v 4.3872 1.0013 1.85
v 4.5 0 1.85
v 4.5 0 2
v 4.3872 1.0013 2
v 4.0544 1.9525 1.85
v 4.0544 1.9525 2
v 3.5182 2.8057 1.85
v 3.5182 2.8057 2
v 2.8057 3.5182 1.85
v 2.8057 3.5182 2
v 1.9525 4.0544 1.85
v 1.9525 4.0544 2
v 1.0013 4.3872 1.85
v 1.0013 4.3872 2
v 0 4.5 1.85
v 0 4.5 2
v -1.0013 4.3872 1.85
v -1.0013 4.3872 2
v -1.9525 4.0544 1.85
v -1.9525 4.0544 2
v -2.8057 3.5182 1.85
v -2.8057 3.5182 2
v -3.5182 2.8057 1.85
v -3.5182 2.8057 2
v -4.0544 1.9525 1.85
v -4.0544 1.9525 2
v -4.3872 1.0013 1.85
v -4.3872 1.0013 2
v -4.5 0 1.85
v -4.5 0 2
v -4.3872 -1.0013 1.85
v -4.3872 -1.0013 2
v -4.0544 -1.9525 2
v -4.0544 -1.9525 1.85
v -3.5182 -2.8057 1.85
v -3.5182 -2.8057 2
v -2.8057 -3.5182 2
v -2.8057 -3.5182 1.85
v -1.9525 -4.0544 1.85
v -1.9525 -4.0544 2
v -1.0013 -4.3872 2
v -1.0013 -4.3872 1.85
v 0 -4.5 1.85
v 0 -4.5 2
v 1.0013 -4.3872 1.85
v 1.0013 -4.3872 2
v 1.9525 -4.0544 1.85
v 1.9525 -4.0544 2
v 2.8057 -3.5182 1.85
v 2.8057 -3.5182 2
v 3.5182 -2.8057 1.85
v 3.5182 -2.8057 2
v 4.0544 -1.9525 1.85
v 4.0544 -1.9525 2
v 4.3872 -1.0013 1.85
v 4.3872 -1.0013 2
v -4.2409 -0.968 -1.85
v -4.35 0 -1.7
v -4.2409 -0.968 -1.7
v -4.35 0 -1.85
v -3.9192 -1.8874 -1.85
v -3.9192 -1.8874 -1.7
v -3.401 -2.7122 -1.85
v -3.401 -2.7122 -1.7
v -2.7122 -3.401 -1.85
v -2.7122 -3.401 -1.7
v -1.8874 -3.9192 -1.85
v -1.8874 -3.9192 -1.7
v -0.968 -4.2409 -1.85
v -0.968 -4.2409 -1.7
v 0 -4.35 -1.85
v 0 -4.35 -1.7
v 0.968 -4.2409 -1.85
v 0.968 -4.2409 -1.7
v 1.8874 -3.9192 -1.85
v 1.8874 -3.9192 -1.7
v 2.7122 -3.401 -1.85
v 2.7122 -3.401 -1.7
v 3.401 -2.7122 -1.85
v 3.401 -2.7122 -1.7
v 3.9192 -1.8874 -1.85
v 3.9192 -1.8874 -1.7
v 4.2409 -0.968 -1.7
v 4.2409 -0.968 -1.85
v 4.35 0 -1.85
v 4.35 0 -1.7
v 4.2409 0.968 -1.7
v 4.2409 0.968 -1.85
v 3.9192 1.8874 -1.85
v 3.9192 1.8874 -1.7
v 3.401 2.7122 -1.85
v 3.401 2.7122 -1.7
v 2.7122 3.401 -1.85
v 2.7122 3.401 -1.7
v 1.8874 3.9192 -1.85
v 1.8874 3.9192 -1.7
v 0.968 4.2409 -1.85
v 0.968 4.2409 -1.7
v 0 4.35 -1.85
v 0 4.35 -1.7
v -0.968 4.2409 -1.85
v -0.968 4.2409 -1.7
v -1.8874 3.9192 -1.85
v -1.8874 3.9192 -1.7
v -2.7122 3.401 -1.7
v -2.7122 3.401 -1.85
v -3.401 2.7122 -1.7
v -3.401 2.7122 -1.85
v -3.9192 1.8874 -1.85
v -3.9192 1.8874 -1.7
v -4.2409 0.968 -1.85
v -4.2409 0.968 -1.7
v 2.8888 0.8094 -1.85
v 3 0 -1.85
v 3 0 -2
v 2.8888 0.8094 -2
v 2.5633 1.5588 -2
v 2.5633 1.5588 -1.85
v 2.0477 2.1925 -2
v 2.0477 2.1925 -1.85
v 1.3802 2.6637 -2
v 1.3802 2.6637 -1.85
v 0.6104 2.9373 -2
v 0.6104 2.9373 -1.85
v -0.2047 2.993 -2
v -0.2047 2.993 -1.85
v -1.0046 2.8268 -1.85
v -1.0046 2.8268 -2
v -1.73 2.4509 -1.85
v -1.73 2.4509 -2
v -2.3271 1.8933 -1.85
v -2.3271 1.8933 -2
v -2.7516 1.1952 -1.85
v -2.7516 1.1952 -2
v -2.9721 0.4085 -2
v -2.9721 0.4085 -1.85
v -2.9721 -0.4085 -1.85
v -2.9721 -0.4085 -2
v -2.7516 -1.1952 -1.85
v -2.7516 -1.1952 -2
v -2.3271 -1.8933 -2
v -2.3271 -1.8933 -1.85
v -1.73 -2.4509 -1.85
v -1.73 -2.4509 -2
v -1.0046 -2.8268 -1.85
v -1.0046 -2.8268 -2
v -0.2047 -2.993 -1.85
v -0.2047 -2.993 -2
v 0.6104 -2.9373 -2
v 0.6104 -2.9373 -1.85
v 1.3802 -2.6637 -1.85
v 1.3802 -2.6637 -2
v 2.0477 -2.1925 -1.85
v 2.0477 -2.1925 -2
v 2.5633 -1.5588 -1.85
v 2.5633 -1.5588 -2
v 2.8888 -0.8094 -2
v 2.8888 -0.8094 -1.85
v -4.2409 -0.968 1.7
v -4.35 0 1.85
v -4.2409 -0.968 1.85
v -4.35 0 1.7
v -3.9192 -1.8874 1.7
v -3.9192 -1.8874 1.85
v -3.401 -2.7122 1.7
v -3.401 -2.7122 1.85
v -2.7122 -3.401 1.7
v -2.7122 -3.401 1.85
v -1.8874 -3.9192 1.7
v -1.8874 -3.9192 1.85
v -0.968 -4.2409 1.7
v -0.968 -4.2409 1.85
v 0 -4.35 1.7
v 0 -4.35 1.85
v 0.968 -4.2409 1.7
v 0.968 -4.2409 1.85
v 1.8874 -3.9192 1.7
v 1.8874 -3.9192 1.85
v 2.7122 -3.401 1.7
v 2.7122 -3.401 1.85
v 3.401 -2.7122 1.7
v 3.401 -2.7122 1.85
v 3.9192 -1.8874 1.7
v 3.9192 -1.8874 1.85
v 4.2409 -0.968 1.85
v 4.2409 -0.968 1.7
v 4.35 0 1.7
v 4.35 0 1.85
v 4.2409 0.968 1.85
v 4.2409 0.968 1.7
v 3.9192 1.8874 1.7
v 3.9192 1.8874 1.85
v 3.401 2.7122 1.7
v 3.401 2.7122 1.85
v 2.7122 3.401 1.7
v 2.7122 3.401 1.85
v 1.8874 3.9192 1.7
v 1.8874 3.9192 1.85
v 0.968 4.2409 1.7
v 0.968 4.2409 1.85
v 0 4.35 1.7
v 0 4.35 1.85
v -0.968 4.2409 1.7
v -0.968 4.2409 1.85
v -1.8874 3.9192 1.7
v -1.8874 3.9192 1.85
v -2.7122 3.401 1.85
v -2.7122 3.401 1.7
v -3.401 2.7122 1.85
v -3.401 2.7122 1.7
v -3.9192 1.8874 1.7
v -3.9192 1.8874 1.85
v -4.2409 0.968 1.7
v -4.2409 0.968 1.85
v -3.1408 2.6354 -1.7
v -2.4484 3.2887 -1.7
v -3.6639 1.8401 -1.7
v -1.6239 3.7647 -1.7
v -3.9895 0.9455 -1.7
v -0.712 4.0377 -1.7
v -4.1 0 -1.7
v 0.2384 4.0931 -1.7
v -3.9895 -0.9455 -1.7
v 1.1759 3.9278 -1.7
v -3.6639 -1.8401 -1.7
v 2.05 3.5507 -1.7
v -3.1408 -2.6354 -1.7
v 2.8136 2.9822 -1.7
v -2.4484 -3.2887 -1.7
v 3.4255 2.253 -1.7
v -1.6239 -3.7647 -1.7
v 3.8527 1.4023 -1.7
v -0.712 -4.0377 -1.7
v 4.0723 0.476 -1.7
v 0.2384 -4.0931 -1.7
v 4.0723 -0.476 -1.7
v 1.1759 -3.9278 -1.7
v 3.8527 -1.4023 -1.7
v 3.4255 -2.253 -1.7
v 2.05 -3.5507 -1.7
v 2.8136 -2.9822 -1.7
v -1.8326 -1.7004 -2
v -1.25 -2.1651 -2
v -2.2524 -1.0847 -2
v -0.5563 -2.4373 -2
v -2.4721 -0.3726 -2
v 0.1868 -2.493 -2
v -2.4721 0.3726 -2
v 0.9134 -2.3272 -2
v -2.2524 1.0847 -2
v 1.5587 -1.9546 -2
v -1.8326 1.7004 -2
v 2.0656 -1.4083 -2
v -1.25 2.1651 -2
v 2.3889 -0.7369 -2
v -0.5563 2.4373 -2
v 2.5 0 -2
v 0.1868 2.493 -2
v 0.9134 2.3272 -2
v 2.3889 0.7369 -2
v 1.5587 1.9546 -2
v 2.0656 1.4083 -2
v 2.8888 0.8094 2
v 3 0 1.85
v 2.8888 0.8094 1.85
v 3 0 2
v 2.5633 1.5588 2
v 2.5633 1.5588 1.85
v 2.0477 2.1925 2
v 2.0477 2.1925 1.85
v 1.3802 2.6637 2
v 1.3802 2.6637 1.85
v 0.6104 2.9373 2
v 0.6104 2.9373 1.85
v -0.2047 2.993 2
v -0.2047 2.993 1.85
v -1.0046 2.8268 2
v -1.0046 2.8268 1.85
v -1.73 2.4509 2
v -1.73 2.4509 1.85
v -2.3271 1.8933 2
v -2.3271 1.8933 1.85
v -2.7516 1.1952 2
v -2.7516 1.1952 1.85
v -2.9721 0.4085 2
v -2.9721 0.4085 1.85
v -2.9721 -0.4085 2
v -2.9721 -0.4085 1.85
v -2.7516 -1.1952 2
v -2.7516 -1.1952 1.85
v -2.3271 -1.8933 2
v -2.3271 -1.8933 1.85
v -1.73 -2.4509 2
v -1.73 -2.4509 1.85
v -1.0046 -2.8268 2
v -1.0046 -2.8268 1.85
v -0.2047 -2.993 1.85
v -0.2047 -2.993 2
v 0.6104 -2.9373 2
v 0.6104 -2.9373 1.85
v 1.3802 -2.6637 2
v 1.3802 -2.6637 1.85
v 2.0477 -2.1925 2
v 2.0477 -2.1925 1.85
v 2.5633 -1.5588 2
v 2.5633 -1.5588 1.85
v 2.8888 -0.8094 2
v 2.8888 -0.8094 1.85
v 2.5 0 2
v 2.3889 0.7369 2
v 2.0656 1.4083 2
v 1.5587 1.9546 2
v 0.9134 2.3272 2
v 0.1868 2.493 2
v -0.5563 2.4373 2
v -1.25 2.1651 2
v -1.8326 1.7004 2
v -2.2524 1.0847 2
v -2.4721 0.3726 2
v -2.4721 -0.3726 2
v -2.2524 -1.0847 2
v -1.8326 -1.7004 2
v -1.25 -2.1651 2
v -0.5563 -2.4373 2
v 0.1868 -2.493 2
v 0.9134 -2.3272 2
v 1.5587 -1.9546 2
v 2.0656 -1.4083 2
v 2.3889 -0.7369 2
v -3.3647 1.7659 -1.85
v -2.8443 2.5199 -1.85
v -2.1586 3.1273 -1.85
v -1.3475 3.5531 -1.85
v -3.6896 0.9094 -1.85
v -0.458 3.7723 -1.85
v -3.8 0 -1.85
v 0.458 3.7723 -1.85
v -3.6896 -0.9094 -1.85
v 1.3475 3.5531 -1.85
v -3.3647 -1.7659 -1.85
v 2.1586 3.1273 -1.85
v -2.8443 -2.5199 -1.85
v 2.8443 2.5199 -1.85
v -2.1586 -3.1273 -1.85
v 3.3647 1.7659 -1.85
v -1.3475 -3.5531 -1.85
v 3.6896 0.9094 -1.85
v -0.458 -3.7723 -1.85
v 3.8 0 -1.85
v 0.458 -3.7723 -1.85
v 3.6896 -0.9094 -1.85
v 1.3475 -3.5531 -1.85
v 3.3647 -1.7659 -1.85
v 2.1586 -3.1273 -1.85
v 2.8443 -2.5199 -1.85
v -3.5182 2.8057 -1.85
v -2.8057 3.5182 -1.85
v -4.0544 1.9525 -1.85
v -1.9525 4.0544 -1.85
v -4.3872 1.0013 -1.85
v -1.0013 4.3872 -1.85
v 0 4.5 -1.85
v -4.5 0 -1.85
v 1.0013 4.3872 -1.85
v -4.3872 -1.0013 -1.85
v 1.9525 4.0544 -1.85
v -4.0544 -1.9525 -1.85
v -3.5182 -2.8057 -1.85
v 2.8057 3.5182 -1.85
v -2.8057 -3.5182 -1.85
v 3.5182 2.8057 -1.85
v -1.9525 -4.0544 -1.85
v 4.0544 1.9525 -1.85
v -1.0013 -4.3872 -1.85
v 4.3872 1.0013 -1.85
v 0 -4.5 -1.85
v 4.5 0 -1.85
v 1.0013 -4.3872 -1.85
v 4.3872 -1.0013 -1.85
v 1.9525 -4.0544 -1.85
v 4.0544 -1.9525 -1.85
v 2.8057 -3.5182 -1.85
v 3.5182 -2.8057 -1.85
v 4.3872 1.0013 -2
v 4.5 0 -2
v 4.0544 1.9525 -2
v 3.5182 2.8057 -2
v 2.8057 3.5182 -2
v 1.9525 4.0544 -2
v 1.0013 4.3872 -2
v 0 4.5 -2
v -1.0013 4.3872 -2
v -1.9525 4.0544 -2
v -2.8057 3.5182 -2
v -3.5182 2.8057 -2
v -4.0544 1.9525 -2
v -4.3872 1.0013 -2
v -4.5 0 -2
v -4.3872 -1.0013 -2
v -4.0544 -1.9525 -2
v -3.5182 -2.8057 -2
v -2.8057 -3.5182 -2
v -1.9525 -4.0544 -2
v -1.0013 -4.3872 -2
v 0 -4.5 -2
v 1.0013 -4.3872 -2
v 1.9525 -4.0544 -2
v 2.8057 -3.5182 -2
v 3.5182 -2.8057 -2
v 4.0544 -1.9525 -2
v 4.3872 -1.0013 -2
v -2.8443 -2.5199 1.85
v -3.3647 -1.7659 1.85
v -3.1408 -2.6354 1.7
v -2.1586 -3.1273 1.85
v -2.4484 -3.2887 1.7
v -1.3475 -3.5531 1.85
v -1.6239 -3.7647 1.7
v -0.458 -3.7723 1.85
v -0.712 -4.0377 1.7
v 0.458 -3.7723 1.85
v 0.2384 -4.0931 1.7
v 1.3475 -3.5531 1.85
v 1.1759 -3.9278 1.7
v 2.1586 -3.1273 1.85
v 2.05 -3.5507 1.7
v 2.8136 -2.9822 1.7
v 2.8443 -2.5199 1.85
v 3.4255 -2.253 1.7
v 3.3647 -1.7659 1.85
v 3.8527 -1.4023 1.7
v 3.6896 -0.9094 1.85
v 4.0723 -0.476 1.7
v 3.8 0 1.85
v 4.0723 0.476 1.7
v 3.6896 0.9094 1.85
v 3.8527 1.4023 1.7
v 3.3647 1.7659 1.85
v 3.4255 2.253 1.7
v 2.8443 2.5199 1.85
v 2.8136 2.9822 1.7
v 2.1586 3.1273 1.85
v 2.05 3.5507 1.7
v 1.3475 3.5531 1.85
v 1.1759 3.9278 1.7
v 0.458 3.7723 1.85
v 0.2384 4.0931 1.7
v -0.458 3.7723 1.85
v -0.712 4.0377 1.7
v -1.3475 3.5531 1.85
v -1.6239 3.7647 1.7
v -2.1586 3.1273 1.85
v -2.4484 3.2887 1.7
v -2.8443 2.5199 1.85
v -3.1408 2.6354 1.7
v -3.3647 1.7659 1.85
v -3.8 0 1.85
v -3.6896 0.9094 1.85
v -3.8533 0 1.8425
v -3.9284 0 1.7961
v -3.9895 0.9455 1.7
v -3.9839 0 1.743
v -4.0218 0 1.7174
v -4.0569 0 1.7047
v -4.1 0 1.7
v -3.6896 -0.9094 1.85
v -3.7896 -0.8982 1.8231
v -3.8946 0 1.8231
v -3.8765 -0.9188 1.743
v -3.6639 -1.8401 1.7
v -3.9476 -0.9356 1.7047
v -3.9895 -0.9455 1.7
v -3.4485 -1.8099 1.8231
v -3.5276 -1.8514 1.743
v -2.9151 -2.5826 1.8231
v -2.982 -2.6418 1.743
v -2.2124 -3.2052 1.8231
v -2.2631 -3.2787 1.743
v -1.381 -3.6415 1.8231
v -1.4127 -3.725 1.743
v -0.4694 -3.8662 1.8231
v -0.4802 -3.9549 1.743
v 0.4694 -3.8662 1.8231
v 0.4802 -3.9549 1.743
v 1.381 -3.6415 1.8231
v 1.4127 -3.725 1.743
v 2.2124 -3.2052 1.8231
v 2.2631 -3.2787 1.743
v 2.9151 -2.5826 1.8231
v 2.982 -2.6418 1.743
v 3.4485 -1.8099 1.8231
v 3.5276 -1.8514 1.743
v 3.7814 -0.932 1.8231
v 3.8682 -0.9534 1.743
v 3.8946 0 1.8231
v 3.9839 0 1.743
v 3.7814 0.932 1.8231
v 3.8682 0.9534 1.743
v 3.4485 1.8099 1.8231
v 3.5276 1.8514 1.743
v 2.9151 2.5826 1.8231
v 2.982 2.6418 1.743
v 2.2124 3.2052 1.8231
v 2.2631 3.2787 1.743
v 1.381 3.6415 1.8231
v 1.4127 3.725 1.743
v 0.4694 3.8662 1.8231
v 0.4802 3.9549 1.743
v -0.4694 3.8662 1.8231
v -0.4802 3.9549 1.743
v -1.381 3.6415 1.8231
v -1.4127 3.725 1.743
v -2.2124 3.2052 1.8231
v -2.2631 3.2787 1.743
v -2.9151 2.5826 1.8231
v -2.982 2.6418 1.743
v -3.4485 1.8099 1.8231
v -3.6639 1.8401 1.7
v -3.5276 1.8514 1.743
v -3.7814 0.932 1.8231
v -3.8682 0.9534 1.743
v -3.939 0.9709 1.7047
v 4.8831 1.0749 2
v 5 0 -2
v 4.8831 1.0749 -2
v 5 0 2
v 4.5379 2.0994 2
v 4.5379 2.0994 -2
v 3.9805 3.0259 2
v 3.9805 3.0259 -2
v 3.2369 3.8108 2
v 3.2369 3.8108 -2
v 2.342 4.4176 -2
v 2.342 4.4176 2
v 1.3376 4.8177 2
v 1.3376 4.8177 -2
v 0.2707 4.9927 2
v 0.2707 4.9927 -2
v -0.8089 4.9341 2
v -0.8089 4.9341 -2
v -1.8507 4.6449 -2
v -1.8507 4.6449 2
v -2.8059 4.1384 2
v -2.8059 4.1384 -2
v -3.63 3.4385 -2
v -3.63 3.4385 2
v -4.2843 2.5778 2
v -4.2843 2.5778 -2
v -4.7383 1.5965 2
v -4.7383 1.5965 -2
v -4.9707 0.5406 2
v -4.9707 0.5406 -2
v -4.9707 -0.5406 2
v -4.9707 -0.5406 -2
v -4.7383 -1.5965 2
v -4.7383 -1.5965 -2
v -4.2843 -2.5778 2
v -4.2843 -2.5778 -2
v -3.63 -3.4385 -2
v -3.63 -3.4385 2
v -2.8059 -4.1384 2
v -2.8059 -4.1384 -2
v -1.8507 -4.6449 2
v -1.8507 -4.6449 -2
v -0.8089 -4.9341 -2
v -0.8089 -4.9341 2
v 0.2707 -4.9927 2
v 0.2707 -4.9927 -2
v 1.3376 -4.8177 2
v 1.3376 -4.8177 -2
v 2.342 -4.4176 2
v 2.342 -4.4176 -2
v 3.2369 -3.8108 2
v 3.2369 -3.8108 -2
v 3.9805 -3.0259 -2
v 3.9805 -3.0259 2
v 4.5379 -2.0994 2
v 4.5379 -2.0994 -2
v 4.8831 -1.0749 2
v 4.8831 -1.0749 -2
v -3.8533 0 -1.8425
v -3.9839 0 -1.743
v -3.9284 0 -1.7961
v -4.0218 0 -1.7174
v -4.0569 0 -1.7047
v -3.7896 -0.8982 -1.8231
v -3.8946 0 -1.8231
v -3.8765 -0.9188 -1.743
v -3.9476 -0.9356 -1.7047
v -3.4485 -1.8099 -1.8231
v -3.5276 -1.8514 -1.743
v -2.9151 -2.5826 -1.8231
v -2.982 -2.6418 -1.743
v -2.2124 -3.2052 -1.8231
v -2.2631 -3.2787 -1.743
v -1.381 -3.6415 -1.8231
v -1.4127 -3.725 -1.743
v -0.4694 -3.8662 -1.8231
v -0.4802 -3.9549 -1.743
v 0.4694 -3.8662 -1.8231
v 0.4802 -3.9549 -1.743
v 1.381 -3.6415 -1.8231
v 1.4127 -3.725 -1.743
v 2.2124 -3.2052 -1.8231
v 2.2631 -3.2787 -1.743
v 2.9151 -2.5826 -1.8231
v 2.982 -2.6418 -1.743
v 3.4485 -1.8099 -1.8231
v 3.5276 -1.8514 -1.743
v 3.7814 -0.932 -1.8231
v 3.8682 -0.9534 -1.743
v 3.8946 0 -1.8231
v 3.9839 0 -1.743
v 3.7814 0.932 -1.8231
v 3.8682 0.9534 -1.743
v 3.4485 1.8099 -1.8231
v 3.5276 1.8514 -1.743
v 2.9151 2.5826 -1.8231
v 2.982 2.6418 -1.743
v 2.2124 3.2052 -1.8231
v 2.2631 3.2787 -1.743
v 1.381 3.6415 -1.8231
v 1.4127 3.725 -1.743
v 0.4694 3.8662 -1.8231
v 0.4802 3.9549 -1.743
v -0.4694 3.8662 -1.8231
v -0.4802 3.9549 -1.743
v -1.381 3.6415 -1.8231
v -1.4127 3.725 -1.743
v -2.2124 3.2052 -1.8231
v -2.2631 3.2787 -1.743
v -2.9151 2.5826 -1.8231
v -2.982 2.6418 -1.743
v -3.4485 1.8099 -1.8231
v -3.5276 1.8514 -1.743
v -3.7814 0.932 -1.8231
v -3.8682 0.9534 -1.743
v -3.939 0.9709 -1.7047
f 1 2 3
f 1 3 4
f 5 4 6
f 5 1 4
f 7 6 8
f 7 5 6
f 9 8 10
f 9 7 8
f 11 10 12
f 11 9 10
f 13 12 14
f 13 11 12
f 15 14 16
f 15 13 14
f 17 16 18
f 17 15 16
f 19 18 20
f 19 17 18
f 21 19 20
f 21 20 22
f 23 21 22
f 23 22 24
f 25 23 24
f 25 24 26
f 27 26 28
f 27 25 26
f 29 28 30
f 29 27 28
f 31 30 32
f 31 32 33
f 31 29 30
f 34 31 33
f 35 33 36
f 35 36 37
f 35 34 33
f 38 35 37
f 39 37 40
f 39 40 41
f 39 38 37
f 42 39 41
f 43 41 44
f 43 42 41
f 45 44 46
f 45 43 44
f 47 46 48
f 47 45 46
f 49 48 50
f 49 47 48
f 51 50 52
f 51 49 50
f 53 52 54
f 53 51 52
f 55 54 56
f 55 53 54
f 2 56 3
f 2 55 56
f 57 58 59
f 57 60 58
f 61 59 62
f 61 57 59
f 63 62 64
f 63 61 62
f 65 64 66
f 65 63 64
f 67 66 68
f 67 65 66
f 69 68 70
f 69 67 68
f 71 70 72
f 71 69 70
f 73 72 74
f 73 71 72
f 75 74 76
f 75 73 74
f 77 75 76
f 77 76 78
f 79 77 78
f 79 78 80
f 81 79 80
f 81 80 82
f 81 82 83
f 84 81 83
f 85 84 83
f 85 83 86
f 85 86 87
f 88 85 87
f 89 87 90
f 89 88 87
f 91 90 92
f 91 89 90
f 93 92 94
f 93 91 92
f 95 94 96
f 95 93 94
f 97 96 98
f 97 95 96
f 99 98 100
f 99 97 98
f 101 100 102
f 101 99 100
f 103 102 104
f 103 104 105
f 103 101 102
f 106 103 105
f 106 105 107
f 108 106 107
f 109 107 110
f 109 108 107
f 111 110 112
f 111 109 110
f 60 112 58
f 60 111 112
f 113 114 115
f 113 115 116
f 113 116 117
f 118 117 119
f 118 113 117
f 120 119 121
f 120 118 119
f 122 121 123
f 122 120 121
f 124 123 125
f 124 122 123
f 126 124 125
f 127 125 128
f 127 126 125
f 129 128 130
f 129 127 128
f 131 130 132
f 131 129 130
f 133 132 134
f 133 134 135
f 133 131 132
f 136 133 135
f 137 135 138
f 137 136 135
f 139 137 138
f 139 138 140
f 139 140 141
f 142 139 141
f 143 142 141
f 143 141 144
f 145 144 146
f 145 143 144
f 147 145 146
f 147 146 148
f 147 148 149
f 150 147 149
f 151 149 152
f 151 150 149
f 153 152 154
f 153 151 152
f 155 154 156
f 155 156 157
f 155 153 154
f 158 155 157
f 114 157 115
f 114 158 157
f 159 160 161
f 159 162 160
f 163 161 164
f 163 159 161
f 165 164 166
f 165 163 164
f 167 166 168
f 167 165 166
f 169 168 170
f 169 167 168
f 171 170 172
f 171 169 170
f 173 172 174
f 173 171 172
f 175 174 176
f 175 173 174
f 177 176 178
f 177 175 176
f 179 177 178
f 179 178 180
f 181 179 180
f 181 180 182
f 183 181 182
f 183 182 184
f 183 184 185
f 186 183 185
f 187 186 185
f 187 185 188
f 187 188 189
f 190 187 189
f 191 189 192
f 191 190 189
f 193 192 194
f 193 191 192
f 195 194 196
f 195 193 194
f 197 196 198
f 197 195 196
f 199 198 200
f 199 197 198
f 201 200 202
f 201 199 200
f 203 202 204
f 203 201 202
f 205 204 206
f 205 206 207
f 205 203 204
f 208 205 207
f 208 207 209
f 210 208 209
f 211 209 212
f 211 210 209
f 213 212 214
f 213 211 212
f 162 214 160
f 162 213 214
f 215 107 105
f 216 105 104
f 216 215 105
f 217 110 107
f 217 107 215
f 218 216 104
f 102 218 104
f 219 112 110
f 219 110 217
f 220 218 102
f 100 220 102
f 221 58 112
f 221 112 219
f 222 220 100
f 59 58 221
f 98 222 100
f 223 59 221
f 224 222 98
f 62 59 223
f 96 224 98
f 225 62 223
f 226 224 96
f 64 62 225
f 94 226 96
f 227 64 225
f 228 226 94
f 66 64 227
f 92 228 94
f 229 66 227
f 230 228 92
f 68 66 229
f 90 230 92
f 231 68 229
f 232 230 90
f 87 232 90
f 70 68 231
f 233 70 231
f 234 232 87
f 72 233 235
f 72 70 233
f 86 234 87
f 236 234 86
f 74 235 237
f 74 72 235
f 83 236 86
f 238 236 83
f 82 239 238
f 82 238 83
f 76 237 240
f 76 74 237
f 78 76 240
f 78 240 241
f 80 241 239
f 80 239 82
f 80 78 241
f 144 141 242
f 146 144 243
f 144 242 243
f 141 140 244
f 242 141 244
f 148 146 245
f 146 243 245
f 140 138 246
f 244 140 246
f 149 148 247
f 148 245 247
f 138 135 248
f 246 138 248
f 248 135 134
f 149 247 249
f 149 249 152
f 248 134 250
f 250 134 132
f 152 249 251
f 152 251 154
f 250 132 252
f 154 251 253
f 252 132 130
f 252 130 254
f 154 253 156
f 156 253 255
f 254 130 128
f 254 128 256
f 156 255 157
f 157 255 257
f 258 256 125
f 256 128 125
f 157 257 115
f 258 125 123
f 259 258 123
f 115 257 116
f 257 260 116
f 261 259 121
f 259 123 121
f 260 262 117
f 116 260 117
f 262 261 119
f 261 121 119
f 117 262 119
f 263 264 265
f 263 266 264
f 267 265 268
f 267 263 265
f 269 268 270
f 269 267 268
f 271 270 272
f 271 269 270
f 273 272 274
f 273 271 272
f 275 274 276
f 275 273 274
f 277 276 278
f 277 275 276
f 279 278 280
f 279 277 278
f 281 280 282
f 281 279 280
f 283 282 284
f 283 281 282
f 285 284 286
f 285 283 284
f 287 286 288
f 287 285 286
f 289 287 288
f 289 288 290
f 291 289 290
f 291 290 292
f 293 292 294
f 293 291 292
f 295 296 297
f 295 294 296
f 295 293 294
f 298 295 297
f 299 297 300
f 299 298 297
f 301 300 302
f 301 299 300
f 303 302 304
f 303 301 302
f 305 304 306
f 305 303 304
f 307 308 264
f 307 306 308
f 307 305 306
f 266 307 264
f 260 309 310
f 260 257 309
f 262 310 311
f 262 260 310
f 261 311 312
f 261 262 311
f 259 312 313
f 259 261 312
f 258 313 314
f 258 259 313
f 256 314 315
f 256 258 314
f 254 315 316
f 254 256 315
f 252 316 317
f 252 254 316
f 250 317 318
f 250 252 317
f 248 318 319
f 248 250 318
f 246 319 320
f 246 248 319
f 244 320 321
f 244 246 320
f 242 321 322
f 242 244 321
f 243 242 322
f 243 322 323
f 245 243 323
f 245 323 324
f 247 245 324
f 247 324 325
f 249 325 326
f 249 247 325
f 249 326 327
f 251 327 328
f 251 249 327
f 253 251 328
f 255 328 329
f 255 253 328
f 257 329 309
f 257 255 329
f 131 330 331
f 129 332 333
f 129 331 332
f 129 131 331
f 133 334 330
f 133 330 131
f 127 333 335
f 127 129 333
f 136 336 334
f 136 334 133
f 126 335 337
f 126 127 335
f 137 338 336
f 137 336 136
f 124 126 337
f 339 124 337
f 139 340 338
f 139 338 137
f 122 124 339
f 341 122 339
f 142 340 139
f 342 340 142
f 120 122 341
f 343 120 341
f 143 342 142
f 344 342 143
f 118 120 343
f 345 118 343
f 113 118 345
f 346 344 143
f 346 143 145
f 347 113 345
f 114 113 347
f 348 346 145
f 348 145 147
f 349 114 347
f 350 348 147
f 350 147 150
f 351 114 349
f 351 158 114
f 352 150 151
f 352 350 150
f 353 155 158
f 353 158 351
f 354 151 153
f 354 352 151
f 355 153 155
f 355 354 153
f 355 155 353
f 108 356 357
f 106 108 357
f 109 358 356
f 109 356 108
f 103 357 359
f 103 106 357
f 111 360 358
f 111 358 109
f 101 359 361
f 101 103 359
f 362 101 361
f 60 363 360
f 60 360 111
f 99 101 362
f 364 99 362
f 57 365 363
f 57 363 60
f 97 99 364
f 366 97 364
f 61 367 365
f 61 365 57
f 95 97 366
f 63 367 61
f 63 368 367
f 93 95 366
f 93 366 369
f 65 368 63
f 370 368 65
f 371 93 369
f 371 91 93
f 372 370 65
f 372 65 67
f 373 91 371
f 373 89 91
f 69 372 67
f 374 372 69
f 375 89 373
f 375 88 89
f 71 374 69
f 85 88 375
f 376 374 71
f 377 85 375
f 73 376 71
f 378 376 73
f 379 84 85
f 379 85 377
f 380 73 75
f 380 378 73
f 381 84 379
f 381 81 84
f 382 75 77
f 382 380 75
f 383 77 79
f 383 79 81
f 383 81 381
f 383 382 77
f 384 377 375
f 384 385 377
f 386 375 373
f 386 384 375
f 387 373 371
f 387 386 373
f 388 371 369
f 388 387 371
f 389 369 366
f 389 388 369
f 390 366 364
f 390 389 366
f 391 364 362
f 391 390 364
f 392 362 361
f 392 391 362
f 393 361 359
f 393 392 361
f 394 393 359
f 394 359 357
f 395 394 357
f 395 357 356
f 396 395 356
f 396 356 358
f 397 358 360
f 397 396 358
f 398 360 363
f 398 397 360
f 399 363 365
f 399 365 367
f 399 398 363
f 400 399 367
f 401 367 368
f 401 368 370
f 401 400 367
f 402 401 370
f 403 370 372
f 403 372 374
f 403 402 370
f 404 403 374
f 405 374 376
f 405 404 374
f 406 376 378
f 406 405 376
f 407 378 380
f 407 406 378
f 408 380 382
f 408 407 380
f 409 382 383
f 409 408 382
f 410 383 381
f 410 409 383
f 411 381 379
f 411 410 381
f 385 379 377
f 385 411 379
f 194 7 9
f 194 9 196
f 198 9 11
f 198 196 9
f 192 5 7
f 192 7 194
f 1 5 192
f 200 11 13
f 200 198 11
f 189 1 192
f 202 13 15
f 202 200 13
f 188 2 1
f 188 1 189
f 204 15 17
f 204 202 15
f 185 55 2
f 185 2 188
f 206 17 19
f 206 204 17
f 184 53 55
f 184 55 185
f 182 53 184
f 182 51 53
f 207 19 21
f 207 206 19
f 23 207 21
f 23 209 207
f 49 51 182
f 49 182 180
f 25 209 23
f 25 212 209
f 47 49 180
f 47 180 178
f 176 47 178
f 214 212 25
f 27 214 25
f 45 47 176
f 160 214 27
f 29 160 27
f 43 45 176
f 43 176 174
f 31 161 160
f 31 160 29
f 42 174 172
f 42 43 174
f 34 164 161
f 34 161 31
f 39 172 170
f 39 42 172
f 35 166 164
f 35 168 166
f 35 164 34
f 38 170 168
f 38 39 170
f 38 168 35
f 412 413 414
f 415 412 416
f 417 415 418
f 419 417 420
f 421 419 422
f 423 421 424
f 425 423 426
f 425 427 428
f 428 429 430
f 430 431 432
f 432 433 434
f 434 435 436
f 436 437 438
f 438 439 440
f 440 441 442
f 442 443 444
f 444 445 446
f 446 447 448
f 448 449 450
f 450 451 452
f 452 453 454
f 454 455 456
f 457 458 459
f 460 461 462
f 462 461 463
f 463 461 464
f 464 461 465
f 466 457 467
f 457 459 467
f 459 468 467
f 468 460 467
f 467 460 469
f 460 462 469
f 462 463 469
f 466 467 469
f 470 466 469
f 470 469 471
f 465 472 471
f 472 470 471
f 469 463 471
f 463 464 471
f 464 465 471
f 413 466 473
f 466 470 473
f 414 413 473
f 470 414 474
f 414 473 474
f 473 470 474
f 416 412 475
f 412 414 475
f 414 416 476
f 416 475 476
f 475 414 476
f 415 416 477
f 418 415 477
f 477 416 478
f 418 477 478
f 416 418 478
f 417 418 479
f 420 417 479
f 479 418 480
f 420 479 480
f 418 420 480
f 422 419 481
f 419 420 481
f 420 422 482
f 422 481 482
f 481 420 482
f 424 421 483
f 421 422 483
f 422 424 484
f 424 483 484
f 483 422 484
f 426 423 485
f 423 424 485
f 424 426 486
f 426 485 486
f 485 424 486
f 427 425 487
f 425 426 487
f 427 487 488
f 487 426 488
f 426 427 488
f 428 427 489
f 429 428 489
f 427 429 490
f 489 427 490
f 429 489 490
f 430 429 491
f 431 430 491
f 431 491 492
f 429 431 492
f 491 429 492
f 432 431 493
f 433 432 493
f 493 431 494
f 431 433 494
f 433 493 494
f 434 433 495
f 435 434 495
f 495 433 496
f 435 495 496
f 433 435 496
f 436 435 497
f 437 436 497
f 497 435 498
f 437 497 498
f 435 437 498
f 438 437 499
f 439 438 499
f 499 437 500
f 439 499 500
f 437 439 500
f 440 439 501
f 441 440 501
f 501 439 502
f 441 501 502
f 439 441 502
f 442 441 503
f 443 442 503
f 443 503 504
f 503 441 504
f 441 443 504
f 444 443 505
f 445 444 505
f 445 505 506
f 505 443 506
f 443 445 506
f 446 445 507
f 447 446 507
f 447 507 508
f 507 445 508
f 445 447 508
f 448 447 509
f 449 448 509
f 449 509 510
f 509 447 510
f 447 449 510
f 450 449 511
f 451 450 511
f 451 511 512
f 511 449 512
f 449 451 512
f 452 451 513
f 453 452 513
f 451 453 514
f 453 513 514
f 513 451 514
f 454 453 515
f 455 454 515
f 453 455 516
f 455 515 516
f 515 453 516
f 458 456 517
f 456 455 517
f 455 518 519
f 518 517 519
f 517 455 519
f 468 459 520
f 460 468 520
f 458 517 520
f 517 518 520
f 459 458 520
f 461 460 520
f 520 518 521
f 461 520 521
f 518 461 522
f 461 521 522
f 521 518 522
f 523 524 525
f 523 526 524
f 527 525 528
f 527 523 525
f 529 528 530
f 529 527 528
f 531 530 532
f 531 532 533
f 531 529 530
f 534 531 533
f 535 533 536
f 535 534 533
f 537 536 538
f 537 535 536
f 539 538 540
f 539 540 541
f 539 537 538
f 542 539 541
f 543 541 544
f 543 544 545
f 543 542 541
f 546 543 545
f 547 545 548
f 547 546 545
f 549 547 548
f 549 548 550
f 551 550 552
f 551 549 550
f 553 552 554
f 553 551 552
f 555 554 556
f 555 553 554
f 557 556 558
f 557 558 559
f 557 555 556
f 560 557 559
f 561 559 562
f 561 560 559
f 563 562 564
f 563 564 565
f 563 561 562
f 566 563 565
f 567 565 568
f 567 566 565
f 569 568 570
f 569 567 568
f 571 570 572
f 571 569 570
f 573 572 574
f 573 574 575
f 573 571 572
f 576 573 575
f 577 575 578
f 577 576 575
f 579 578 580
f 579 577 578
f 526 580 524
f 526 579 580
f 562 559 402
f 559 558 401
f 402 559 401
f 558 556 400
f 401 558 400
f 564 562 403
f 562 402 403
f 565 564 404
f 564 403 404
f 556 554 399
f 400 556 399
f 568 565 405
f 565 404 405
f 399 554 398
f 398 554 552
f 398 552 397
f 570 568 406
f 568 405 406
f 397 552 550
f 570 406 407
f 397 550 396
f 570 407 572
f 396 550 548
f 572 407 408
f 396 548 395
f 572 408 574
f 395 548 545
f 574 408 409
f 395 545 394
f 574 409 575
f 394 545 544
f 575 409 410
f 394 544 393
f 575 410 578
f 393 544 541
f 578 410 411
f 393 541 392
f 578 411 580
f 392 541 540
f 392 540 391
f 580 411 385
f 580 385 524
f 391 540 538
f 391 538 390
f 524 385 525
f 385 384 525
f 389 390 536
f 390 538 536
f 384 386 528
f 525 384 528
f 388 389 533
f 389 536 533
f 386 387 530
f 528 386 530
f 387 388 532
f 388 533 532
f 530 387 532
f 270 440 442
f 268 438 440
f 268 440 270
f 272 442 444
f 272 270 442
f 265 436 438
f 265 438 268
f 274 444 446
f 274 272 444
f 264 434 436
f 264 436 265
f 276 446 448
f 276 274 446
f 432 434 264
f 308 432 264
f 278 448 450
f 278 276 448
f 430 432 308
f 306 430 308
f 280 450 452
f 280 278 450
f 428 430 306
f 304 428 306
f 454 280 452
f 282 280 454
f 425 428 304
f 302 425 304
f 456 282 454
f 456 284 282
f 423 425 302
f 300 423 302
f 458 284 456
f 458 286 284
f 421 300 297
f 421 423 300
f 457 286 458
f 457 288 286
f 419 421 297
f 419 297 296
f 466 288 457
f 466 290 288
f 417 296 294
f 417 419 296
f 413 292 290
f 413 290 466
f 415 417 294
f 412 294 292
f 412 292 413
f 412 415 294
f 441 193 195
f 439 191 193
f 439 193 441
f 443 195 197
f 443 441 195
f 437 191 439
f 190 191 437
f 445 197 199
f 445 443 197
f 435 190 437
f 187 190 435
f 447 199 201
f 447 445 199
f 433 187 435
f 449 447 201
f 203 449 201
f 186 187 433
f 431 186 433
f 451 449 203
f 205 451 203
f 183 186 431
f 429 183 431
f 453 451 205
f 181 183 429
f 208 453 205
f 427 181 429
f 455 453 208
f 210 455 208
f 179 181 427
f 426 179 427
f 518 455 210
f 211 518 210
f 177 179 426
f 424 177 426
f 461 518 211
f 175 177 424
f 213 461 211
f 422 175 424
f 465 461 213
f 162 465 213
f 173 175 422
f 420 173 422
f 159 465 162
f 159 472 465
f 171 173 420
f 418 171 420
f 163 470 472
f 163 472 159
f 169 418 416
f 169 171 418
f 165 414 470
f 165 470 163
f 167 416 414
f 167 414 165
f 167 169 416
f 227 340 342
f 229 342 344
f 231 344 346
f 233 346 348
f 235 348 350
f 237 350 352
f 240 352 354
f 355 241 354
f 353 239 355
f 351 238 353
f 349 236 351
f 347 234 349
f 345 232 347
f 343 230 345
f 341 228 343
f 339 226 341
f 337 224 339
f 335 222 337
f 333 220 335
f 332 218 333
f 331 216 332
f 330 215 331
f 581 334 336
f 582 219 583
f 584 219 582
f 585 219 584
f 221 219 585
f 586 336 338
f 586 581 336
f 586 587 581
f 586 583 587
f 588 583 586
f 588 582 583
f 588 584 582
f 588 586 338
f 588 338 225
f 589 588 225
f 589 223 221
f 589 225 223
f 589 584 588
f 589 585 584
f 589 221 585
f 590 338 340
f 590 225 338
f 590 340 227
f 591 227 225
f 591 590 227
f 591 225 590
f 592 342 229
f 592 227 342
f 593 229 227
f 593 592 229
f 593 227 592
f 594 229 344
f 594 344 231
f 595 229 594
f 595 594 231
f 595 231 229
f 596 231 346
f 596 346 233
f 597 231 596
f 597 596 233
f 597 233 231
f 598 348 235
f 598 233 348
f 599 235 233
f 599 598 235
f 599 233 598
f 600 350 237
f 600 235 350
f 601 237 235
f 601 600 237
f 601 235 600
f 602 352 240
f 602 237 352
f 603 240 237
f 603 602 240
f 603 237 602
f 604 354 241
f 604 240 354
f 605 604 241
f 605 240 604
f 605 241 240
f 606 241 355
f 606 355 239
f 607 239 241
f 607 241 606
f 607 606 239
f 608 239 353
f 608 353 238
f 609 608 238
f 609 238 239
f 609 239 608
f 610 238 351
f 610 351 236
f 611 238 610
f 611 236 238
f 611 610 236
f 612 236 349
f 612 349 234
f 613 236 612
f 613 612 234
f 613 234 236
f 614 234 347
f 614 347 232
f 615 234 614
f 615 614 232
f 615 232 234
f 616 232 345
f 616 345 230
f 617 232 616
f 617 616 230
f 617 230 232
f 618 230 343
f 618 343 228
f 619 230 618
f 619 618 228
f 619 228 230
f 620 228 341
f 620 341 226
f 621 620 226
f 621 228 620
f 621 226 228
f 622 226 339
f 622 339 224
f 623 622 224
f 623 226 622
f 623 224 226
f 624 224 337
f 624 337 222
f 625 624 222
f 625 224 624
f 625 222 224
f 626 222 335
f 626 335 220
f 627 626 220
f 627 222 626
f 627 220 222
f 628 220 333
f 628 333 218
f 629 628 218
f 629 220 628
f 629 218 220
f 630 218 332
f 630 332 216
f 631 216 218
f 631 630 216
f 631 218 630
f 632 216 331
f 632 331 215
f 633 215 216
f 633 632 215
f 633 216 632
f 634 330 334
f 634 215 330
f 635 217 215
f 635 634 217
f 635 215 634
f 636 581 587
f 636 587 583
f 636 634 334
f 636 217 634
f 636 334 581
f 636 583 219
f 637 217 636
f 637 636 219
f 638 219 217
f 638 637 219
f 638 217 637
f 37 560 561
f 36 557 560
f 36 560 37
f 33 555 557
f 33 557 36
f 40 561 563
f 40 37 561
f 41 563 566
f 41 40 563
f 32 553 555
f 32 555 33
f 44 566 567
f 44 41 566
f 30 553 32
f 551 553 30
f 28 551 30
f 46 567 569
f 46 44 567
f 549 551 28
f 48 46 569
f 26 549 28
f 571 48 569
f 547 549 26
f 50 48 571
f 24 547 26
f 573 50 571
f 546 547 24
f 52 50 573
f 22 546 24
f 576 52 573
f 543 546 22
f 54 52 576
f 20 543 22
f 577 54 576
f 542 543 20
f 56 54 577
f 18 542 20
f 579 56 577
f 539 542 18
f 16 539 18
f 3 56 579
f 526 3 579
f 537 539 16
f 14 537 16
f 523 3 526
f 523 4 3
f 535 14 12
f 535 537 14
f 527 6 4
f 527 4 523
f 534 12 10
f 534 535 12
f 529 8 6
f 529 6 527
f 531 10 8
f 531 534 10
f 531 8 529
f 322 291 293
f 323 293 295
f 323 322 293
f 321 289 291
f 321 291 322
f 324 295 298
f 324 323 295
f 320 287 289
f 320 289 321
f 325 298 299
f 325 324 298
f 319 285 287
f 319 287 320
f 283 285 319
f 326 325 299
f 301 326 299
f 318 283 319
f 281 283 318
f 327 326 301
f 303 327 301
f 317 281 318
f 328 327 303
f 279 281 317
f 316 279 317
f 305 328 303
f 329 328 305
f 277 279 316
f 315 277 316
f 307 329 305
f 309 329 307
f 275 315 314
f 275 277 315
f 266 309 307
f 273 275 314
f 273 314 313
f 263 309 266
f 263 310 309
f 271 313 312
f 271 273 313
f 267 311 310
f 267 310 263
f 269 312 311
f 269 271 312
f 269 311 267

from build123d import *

# Parameters (mm, degrees)
SKETCH_1_R        = 5
SKETCH_1_R_2      = 4.5
EXTRUDE_1_DEPTH   = 2
SKETCH_1_R_3      = 3
SKETCH_1_R_4      = 2.5
EXTRUDE_1_2_DEPTH = 2


with BuildPart() as part:
    # Эскиз1 → Бобышка-Вытянуть1 (new, symmetric)
    with BuildSketch(Plane.XY):
        Circle(SKETCH_1_R)
        Circle(SKETCH_1_R_2, mode=Mode.SUBTRACT)
    extrude(amount=EXTRUDE_1_DEPTH, both=True)



with BuildPart() as body_2:
    # Эскиз1 → Extrude 1 2 (new, symmetric)
    with BuildSketch(Plane.XY):
        Circle(SKETCH_1_R_3)
        Circle(SKETCH_1_R_4, mode=Mode.SUBTRACT)
    extrude(amount=EXTRUDE_1_2_DEPTH, both=True)


with BuildPart() as part_1:
    add(part.part)

    add(body_2.part)  # Повернуть1 merges body 2
    # Эскиз3 → Повернуть1 (revolve)
    with BuildSketch(Plane(origin=(0, 0, 0), x_dir=(1, 0, 0), z_dir=(0, 1, 0)), mode=Mode.PRIVATE) as revolve_1_sk:
        with BuildLine():
            Line((4.35, -1.7), (4.1, -1.7))
            add(Edge.make_bspline(
                [(3.8, -1.85), (3.95, -1.85), (3.95, -1.7), (4.1, -1.7)],
                knots=[0, 0, 0, 0, 1, 1, 1, 1], degree=3))
            Line((3.8, -1.85), (3, -1.85))
            Line((3, -1.85), (3, 0))
            Line((3, 0), (3, 1.85))
            Line((3, 1.85), (3.8, 1.85))
            add(Edge.make_bspline(
                [(3.8, 1.85), (3.95, 1.85), (3.95, 1.7), (4.1, 1.7)],
                knots=[0, 0, 0, 0, 1, 1, 1, 1], degree=3))
            Line((4.1, 1.7), (4.35, 1.7))
            Line((4.35, 1.7), (4.35, 1.85))
            Line((4.35, 1.85), (4.5, 1.85))
            Line((4.5, 1.85), (4.5, 0))
            Line((4.5, 0), (4.5, -1.85))
            Line((4.5, -1.85), (4.35, -1.85))
            Line((4.35, -1.85), (4.35, -1.7))
        make_face()
    revolve(revolve_1_sk.sketch.rotate(Axis((0, 0, -2), (0, 0, 1)), 180), axis=Axis((0, 0, -2), (0, 0, 1)))


solid = part_1.part
